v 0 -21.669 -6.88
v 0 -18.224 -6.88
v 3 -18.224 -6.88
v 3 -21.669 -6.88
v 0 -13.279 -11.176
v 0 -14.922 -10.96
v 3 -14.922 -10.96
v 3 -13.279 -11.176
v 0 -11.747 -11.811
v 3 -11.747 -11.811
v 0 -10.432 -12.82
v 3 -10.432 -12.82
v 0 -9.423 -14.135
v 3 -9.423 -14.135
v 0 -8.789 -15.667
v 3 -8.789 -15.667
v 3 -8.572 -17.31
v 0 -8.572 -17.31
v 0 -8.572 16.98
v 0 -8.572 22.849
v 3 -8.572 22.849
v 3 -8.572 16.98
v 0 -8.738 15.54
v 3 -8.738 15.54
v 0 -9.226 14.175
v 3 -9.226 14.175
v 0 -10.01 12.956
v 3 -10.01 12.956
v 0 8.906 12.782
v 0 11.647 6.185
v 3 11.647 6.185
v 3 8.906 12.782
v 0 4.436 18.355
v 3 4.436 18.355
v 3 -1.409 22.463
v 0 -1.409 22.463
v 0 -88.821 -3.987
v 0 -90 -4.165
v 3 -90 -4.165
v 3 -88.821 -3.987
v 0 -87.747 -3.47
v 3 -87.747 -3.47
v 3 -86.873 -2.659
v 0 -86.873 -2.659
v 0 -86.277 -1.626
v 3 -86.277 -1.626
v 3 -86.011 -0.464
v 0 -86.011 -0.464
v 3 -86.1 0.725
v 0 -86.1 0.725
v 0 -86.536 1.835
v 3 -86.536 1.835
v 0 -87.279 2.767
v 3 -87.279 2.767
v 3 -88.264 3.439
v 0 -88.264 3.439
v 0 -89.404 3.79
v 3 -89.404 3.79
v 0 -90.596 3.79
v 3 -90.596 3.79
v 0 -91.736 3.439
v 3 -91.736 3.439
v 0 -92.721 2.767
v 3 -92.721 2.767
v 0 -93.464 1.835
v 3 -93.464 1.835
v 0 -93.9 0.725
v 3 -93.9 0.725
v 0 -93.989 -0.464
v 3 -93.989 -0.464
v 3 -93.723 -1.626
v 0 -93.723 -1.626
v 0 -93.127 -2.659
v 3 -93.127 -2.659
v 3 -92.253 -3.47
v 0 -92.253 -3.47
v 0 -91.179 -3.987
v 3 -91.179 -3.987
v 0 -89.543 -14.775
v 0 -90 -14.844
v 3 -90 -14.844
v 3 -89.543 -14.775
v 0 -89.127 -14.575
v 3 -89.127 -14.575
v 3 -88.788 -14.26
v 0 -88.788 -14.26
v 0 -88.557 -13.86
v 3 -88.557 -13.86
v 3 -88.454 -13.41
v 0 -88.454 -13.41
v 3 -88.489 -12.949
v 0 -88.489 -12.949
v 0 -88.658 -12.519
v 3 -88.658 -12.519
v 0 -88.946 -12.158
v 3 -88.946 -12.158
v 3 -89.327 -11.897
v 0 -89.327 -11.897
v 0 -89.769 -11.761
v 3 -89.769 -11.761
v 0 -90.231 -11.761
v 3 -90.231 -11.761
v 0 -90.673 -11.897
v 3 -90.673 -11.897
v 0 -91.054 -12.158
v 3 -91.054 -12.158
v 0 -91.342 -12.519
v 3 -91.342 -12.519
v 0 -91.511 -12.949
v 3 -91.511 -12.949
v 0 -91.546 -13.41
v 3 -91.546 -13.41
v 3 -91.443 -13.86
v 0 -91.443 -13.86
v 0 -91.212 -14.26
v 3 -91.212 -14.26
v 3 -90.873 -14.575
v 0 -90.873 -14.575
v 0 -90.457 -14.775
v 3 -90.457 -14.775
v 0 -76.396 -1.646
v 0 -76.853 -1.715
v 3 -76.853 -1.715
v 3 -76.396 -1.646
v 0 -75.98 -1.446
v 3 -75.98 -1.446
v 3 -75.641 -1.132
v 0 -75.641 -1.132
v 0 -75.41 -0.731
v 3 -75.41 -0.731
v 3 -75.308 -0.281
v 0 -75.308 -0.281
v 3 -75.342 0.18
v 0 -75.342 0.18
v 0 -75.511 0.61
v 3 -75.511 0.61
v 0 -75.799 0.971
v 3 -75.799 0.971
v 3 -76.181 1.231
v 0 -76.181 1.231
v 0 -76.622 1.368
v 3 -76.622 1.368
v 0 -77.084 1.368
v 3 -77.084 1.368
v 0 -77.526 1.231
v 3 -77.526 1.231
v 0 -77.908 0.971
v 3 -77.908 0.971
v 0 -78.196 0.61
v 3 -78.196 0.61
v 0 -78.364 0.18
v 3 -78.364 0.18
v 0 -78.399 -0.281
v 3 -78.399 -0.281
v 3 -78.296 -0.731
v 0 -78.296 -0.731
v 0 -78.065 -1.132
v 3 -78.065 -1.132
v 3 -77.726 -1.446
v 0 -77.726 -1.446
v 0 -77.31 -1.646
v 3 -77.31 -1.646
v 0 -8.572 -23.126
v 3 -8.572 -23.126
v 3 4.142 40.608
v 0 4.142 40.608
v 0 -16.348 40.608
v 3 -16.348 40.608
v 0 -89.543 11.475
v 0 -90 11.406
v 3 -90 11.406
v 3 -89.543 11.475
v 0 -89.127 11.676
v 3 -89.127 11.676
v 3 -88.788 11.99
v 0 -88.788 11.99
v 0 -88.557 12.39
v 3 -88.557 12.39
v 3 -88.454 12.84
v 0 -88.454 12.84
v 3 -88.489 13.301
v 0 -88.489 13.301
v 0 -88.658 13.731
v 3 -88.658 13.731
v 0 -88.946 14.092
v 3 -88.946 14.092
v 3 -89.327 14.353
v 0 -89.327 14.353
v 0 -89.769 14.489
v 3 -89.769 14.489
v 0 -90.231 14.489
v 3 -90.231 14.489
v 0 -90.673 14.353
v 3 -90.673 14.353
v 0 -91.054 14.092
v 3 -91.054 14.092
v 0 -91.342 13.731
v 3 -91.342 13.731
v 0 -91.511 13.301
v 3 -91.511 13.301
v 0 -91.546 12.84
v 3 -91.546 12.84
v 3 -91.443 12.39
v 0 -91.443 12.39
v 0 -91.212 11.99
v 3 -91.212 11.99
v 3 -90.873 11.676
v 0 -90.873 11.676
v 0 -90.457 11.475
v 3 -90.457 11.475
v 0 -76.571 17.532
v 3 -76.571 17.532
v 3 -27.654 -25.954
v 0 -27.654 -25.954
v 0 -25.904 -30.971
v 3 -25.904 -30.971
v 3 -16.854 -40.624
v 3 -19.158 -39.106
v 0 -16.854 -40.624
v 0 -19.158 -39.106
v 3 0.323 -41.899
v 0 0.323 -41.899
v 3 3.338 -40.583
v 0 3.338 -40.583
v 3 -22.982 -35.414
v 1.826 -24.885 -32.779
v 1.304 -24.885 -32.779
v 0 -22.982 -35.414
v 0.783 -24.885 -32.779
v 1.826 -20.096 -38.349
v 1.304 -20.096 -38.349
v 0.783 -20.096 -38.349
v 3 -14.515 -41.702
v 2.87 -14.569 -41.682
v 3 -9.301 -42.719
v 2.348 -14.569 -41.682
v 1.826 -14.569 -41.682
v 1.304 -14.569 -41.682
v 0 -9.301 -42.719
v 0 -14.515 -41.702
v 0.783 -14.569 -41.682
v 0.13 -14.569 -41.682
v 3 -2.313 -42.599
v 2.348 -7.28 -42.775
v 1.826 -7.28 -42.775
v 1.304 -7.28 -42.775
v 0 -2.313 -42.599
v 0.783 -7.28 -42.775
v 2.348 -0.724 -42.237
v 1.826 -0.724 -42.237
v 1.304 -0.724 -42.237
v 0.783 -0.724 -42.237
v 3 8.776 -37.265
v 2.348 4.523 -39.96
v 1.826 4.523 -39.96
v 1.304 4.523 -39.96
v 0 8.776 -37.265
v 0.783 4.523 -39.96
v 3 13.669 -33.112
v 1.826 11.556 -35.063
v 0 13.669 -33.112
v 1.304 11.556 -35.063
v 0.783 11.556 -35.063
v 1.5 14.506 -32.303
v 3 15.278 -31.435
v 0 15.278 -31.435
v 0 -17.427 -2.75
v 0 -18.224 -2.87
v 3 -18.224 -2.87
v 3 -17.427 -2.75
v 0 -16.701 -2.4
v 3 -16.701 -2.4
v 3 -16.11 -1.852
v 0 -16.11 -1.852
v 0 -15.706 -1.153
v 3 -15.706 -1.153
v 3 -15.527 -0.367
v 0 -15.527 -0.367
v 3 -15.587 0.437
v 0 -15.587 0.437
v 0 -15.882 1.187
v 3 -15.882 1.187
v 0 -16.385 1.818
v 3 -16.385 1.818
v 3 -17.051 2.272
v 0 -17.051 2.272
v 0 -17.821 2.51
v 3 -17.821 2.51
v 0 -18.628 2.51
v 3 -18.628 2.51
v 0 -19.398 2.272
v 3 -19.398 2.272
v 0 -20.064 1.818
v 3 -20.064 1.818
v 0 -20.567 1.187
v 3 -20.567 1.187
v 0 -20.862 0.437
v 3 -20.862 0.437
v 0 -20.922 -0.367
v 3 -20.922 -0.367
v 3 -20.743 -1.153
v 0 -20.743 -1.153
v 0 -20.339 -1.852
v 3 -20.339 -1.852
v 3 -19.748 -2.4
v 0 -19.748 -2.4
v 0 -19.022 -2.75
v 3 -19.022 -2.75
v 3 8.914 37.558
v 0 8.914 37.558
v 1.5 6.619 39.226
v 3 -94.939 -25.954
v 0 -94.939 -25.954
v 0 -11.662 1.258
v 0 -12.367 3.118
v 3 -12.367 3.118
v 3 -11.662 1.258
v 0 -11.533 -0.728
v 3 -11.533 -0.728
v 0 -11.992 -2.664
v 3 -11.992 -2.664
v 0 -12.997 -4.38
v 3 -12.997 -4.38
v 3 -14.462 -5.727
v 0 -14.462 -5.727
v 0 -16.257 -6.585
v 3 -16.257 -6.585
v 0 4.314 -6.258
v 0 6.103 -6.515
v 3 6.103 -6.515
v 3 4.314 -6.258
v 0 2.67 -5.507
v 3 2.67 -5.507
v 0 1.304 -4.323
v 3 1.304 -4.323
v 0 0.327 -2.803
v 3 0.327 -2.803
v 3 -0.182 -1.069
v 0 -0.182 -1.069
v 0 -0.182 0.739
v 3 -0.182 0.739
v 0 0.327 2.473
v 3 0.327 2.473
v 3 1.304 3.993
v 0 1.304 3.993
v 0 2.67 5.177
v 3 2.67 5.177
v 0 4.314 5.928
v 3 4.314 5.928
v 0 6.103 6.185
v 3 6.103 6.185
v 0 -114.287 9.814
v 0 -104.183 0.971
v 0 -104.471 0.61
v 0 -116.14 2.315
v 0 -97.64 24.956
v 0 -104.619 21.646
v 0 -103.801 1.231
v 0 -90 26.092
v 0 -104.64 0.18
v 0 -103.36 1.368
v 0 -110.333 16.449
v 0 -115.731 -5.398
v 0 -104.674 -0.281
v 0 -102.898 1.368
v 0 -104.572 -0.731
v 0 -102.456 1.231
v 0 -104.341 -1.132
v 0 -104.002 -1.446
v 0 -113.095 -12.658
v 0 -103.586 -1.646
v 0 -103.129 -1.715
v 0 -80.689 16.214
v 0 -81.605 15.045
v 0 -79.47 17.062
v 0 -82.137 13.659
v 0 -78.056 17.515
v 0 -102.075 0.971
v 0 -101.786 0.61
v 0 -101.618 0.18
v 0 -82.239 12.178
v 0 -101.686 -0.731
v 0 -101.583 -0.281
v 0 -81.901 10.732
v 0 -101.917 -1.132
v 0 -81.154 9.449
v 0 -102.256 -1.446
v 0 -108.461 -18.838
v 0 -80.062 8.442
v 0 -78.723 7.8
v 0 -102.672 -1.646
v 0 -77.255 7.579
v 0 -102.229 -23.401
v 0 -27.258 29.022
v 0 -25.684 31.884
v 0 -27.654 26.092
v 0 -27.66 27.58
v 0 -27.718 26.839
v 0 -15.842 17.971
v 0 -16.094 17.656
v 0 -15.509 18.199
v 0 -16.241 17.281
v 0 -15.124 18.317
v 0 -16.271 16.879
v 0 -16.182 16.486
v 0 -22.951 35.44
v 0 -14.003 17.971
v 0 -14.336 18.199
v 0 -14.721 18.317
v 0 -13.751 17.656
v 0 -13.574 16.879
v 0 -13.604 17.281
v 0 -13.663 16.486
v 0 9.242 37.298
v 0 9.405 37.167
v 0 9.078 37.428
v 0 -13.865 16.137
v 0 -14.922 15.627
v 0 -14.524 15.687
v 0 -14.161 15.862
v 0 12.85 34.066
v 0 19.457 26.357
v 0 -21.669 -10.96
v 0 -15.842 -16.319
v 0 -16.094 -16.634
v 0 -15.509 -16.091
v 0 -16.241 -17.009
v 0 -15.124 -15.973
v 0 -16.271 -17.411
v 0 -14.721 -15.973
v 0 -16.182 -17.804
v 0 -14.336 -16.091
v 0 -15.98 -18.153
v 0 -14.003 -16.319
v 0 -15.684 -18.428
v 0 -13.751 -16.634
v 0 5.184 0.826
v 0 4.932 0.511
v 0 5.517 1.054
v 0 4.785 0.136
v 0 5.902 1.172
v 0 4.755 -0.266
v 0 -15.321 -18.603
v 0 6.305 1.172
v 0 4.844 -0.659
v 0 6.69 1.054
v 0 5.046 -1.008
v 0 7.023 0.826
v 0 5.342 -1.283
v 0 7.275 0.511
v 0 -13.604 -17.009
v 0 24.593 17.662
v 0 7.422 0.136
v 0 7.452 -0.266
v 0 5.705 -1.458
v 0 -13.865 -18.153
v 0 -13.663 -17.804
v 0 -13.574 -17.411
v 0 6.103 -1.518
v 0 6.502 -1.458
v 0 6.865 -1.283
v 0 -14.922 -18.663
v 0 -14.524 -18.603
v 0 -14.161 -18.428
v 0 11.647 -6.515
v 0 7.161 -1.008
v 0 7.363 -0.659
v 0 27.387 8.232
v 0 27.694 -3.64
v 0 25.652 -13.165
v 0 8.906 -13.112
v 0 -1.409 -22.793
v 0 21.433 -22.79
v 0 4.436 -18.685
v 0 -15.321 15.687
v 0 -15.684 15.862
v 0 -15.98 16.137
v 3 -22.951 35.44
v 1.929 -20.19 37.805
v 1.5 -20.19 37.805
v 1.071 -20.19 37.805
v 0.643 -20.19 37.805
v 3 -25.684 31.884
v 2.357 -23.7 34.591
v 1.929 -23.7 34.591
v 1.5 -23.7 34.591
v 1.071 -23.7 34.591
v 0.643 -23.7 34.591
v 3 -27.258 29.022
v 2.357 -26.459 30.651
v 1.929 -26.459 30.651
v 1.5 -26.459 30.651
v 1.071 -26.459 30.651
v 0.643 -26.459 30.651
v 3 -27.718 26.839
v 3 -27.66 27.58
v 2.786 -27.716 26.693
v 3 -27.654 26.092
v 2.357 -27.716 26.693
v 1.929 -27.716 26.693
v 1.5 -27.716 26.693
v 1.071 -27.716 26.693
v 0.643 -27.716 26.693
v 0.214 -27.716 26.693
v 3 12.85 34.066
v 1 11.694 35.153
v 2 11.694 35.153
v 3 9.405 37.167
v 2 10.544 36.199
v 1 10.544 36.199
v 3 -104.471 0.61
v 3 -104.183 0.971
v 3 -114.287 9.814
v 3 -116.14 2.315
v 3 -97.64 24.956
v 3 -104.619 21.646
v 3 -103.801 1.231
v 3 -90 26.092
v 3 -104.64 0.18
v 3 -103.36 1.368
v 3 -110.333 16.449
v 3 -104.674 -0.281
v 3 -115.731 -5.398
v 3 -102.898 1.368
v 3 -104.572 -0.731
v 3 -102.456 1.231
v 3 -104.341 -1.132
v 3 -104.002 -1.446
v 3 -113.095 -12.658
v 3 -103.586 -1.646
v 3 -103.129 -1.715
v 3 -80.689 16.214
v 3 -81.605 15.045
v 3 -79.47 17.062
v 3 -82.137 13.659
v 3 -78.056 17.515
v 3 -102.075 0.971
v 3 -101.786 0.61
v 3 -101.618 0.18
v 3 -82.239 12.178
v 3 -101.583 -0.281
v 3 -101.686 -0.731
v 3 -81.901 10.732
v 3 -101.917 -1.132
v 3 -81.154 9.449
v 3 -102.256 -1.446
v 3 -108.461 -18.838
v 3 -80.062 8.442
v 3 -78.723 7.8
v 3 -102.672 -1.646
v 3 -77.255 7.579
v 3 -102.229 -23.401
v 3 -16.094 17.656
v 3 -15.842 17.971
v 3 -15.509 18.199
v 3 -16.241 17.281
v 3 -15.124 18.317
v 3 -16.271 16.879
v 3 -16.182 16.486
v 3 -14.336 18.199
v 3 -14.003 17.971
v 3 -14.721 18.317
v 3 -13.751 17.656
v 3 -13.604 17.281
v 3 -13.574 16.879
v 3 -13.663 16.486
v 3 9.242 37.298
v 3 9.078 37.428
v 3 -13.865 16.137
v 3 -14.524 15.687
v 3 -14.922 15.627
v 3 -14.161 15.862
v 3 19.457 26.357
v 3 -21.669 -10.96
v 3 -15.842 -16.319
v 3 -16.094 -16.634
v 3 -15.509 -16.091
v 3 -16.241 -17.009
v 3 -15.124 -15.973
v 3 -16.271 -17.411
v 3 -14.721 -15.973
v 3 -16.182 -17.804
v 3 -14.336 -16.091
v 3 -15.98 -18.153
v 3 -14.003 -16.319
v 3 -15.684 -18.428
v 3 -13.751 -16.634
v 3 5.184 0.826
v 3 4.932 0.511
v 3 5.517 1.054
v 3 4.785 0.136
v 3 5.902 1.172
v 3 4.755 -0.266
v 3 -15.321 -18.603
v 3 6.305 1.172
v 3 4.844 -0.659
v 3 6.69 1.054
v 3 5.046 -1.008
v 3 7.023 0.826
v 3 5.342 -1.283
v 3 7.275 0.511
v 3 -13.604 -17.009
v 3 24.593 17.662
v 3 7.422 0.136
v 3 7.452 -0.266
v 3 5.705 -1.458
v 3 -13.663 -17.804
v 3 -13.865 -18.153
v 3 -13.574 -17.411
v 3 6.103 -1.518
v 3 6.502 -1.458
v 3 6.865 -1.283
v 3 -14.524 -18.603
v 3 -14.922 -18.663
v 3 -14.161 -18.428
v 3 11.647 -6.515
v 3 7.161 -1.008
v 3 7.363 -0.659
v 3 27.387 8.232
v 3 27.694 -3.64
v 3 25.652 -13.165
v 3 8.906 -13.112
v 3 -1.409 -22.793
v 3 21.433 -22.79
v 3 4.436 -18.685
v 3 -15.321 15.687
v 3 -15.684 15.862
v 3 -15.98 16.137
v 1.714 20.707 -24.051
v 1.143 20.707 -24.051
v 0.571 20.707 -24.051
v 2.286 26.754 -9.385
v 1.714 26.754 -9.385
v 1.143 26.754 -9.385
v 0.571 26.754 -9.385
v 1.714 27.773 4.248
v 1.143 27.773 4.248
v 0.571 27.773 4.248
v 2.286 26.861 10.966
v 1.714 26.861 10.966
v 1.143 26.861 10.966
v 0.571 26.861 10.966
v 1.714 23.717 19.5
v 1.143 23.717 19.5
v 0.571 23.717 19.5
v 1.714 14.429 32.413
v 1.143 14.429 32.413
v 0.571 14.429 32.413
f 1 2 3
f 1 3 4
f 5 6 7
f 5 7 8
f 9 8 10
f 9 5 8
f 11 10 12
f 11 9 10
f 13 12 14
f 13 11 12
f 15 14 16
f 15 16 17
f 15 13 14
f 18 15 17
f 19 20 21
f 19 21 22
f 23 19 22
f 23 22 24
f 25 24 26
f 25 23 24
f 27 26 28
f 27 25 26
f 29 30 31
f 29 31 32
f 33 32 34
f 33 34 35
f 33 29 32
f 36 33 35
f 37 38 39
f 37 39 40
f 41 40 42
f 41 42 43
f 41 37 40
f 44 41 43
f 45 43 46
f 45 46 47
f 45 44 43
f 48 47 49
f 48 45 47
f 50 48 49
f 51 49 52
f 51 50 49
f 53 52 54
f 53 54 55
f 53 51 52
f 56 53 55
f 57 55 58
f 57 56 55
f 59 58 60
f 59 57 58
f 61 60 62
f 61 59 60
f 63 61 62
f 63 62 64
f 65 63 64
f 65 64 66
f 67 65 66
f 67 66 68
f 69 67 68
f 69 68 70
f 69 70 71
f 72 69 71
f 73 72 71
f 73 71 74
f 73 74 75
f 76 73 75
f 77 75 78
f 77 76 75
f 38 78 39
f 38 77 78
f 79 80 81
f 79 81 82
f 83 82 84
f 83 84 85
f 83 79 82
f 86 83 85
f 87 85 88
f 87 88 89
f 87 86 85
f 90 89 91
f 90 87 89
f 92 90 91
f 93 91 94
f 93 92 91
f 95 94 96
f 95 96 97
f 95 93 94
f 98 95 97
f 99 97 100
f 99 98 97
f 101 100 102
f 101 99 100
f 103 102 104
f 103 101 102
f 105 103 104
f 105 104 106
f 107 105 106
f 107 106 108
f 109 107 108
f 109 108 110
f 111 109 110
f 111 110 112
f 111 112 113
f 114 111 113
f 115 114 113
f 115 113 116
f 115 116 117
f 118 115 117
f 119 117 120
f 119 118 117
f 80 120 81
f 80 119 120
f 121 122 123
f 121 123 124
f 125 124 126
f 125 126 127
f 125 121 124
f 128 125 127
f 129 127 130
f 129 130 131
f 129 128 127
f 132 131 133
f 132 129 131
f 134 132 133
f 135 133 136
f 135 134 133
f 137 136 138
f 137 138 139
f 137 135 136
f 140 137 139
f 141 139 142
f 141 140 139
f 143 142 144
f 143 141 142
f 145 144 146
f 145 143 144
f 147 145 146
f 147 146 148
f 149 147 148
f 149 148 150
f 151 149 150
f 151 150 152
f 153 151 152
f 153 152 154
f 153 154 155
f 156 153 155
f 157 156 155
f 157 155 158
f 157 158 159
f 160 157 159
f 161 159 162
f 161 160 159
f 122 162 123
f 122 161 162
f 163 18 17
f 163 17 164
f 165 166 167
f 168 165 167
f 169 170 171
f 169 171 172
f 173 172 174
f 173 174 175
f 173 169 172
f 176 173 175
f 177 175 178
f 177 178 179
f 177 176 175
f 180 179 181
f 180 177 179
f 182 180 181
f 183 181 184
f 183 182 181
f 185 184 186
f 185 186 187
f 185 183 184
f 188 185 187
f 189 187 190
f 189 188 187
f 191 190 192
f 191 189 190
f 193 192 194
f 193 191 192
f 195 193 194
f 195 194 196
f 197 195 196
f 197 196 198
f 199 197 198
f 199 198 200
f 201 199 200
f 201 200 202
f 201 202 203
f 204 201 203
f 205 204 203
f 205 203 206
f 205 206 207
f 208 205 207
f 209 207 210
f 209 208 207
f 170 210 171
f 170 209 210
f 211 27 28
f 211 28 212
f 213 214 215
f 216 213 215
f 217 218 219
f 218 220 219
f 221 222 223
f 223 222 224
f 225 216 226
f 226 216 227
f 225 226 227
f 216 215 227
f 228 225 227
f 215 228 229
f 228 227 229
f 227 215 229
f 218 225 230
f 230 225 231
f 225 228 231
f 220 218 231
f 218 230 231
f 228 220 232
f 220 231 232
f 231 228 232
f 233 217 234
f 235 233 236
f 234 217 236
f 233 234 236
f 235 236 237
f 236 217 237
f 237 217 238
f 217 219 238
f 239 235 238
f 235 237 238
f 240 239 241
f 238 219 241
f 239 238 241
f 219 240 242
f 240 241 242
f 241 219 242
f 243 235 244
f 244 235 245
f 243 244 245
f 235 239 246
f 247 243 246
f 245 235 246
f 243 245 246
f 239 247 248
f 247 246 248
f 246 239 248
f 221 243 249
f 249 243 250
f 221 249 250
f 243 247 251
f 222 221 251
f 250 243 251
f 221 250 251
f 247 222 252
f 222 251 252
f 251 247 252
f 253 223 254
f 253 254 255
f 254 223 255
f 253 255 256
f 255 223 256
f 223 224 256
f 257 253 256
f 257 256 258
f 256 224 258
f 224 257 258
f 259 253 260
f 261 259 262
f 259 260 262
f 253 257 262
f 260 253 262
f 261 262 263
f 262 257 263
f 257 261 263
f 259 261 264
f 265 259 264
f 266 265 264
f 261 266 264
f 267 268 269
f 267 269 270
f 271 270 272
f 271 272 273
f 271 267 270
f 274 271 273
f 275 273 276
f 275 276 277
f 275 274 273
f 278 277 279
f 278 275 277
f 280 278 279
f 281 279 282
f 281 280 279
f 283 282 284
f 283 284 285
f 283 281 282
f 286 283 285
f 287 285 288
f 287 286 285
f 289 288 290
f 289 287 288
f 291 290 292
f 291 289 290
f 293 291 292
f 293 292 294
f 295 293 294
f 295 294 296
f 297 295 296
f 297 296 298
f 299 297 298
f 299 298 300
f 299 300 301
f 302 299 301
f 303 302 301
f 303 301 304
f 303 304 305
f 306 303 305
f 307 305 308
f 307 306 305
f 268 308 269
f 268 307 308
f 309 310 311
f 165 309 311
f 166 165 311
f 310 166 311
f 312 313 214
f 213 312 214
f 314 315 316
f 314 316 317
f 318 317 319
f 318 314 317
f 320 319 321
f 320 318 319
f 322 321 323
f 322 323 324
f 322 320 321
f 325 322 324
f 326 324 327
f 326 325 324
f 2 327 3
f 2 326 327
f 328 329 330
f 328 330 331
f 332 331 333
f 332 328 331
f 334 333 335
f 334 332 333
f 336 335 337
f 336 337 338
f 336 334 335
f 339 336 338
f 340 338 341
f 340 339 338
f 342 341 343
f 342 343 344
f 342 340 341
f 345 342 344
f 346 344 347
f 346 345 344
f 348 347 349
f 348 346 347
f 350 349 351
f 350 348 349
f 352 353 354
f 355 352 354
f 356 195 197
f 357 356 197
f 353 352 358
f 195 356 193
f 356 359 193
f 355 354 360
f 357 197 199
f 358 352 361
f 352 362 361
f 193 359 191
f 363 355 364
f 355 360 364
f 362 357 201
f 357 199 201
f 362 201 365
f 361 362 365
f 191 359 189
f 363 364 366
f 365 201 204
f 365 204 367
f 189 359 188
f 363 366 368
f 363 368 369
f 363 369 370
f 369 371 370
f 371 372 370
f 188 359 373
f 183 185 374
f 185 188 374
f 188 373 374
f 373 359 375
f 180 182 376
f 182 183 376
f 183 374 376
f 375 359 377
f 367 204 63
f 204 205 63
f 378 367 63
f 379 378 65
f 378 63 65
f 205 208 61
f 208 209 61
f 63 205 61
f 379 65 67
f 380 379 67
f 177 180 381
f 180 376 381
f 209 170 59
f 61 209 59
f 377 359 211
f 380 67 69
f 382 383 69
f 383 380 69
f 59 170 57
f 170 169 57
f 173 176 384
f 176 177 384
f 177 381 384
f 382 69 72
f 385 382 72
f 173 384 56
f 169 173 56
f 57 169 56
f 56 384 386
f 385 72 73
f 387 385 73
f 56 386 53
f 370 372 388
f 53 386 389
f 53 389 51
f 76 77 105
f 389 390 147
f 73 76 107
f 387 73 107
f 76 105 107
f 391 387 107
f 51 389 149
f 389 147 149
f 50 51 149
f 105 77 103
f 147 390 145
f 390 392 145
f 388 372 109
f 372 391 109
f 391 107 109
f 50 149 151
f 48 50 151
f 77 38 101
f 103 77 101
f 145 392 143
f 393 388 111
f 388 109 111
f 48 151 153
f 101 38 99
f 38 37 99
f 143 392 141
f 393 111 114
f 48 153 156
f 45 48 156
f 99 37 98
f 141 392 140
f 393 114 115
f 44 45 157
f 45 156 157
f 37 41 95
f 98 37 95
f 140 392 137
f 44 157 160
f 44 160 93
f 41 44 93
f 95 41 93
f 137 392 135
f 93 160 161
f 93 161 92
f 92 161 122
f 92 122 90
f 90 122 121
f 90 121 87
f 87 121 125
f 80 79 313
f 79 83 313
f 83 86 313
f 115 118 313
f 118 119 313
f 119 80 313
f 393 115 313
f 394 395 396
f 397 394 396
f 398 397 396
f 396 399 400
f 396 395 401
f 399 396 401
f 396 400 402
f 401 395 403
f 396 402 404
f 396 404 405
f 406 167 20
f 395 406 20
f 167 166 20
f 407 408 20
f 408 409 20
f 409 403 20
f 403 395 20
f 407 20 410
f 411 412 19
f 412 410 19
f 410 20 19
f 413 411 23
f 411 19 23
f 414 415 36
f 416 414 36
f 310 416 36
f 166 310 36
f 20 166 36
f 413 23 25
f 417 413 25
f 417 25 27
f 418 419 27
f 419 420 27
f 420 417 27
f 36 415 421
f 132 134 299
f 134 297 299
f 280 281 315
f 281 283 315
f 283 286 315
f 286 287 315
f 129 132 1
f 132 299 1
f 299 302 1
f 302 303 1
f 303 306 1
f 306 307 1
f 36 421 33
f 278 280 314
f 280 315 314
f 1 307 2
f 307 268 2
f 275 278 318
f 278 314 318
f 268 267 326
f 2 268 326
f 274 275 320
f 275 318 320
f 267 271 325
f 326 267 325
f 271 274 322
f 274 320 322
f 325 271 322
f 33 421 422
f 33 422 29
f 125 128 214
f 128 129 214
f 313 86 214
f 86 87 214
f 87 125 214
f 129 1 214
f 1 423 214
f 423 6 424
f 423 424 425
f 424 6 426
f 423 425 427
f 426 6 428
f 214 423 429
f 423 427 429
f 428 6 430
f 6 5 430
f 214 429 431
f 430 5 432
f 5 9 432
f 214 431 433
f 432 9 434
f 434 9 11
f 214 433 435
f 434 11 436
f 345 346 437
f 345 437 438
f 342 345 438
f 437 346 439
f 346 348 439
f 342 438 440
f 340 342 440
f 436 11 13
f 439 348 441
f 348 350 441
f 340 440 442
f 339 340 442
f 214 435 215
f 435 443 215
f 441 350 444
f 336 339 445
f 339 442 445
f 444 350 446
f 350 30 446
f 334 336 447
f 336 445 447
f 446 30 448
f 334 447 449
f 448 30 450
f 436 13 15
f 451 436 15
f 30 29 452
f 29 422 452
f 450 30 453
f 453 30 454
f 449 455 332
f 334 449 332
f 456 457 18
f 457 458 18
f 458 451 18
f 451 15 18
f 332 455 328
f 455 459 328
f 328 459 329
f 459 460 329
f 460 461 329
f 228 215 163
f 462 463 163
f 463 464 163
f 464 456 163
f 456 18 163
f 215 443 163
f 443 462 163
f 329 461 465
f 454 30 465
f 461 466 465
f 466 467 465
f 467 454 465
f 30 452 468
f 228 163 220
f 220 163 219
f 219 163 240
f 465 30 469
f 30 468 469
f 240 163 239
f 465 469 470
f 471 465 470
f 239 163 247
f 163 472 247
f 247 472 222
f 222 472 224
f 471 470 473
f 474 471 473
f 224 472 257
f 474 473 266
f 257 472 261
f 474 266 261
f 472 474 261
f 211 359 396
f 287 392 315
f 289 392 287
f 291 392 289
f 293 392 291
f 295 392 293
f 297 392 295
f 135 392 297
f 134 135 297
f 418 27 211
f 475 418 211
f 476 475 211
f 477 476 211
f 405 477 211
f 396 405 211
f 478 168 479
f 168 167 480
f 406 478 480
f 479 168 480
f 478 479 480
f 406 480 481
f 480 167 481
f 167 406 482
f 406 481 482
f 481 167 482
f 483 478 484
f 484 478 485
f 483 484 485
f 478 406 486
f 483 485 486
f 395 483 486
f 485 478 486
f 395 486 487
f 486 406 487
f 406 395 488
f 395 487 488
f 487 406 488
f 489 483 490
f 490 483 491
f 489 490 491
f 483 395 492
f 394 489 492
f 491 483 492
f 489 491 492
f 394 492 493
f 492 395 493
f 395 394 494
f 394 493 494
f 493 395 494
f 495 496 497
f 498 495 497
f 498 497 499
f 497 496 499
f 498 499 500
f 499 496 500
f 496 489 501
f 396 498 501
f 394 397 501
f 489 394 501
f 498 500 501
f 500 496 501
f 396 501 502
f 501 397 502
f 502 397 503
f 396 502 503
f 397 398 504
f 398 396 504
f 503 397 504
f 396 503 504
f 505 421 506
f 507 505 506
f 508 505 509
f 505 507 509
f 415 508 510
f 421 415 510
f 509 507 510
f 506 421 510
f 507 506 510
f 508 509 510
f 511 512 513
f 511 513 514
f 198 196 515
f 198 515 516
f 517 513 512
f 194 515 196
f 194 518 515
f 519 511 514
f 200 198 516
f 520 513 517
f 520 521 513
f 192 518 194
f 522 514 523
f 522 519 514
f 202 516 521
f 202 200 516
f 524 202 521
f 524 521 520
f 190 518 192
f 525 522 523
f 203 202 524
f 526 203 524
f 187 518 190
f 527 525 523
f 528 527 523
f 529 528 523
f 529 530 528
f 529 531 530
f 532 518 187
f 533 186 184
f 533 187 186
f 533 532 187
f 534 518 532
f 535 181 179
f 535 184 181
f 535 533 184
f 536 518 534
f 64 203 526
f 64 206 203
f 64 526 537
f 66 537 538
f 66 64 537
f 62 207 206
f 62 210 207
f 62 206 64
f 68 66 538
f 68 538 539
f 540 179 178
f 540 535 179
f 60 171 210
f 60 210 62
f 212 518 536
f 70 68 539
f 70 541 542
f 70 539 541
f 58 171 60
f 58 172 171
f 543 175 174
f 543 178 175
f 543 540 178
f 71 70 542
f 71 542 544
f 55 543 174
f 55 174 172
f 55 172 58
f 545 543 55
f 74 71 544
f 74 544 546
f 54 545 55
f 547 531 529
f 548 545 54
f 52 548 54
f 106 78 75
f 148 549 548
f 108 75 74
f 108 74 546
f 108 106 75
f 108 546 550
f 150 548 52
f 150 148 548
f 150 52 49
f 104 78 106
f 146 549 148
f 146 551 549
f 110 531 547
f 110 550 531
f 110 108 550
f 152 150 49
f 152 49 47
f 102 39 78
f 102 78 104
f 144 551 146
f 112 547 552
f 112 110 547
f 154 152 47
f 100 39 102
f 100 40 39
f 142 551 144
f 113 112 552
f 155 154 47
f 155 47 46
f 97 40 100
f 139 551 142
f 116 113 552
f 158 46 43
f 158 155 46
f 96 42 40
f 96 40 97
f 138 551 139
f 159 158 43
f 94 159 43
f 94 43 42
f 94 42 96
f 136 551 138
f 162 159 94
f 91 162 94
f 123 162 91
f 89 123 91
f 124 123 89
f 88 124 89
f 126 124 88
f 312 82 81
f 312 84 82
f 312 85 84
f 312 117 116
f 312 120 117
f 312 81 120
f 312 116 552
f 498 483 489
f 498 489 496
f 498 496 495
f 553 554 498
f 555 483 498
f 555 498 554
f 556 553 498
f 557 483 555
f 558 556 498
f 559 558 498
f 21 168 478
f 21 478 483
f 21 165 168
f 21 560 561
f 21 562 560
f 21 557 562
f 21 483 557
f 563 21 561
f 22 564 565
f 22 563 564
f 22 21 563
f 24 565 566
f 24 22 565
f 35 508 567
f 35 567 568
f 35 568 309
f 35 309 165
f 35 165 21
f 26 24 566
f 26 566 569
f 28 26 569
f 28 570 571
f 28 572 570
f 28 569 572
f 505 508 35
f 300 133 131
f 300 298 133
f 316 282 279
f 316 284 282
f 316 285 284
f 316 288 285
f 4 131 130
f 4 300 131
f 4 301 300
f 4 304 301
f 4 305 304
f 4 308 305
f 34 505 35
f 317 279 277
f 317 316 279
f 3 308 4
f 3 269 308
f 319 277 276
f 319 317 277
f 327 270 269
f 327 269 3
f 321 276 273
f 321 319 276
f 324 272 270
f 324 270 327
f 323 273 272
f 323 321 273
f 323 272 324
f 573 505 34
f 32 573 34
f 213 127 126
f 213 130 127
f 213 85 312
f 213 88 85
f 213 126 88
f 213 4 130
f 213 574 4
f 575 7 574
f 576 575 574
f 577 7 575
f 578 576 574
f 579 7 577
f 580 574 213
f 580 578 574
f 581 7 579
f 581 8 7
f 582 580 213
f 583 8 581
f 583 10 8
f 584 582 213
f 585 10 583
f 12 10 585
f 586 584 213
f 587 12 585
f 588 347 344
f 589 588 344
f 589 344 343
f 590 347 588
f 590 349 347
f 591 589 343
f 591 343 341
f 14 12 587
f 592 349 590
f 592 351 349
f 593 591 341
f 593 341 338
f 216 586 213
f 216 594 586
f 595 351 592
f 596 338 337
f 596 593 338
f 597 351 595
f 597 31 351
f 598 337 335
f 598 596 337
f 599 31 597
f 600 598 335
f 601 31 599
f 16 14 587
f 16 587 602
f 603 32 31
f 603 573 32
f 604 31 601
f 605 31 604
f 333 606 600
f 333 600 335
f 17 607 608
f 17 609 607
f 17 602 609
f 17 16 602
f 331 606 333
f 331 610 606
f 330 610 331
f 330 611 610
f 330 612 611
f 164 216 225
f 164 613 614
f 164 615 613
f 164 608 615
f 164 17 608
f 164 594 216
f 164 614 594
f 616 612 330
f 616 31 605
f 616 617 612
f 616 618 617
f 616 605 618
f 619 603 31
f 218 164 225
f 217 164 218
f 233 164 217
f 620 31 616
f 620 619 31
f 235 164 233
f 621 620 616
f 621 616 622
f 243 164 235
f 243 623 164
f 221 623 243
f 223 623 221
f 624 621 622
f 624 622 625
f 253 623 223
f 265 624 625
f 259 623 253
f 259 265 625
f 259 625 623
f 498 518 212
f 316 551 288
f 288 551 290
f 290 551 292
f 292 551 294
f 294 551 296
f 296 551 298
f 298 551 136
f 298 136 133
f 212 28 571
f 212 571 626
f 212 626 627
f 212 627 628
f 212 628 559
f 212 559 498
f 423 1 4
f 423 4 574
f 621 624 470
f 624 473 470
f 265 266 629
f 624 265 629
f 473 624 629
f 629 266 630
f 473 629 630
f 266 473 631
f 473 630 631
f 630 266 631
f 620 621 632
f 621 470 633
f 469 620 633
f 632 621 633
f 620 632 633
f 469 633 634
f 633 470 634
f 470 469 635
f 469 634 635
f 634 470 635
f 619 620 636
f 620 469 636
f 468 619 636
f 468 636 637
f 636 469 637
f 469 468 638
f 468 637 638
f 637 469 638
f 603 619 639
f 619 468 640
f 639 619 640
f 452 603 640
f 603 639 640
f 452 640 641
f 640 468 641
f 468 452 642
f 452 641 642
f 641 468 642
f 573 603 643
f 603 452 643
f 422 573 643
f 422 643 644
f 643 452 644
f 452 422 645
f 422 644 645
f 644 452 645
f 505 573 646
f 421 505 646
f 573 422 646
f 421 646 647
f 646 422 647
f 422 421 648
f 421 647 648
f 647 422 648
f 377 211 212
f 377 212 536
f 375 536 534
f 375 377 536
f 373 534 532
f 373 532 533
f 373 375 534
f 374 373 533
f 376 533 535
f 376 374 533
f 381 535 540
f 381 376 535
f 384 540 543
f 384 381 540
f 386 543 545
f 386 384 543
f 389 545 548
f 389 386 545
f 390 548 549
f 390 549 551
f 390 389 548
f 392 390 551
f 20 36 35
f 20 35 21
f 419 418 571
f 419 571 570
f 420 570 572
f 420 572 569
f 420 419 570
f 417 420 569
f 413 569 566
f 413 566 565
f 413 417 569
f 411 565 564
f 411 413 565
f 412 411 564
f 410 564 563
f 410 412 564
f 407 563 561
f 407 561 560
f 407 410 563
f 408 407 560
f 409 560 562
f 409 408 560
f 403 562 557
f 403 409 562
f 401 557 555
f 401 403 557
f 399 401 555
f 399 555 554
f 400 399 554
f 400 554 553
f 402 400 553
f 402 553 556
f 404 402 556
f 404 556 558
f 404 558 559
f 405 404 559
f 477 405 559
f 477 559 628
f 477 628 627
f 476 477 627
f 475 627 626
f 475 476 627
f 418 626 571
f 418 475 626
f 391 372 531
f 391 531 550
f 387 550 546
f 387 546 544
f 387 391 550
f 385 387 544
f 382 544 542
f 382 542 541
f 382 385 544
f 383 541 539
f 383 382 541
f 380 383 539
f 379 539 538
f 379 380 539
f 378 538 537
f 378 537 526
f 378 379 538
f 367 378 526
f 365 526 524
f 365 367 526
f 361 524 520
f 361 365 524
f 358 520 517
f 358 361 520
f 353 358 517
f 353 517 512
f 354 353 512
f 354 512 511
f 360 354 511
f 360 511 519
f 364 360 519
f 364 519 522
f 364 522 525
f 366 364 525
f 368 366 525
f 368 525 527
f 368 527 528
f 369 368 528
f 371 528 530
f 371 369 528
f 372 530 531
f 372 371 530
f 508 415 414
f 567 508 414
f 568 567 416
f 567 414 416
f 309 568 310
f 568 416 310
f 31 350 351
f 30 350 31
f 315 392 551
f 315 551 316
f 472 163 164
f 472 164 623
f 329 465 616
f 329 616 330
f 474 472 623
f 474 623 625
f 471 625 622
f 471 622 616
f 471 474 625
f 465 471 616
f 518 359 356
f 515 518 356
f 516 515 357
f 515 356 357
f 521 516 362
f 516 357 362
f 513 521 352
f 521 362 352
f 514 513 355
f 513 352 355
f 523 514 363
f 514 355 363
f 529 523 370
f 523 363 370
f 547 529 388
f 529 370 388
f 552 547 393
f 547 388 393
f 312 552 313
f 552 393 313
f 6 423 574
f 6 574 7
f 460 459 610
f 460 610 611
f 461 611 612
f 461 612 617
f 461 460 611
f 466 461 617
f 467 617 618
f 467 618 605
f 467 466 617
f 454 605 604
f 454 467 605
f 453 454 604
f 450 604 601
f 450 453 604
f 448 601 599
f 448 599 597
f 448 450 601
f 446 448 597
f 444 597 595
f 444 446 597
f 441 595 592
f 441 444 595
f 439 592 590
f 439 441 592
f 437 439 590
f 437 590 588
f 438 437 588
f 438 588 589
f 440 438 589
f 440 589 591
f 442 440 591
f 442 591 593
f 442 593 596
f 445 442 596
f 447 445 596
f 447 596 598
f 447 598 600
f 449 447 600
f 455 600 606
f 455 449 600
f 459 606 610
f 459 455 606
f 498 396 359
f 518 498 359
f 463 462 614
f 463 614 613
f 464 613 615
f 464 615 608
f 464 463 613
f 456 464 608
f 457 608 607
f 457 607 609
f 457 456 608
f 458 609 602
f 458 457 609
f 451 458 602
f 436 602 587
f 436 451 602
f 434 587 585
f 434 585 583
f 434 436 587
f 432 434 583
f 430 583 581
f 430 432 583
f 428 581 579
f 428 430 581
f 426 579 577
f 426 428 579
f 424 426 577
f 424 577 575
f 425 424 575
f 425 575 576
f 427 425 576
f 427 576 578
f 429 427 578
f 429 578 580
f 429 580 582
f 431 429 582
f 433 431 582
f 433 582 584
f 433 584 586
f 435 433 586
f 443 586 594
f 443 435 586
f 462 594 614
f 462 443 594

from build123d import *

# Parameters (mm, degrees)
ESQUISSE3_R        = 1.35255
ESQUISSE3_R_2      = 2.7051
ESQUISSE3_R_3      = 1.55
ESQUISSE3_R_4      = 4
BOSS_EXTRU_2_DEPTH = 3


with BuildPart() as part:
    # Esquisse3 → Boss.-Extru.2 (new body)
    with BuildSketch(Plane(origin=(0, 0, 0), x_dir=(0, 0, -1), z_dir=(1, 0, 0))):
        with BuildLine():
            Line((-40.60825, -16.144875), (-40.60825, -16.348305132))
            add(Edge.make_bspline(
                [(-40.60825, -16.348305132), (-40.365634485, -16.661193605), (-40.112338127, -16.96547542), (-39.63020507, -17.593748723), (-39.400688032, -17.917191992), (-38.719045939, -18.893089111), (-38.271947044, -19.549593057), (-37.338540998, -20.831006808), (-36.855460104, -21.458516341), (-36.059725811, -22.342477591), (-35.781944124, -22.627029047), (-35.202868212, -23.17718548), (-34.900674383, -23.443503751), (-33.971943166, -24.212706181), (-33.324405882, -24.685383849), (-32.010805282, -25.604549776), (-31.348089528, -26.055770333), (-30.303090708, -26.660610546), (-29.948270215, -26.848696892), (-29.222483721, -27.184971005), (-28.851412004, -27.333773538), (-28.083597976, -27.570691368), (-27.685315555, -27.657976057), (-27.090666934, -27.715403346), (-26.891908645, -27.722631025), (-26.592836888, -27.712936491), (-26.492990431, -27.706278992), (-26.292963936, -27.685632014), (-26.192732932, -27.670522326), (-26.092449031, -27.65425)],
                knots=[0, 0, 0, 0, 0.0625, 0.0625, 0.125, 0.125, 0.25, 0.25, 0.375, 0.375, 0.4375, 0.4375, 0.5, 0.5, 0.625, 0.625, 0.75, 0.75, 0.8125, 0.8125, 0.875, 0.875, 0.9375, 0.9375, 0.96875, 0.96875, 0.984375, 0.984375, 1, 1, 1, 1], degree=3))
            Line((-26.092449031, -27.65425), (-26.092449031, -90))
            ThreePointArc((-26.092449031, -90), (-2.31531669, -116.14013034), (25.954024412, -94.93864949))
            Line((25.954024412, -94.93864949), (25.954024412, -27.65425))
            add(Edge.make_bspline(
                [(25.954024412, -27.65425), (27.179118802, -27.419536533), (28.353377808, -27.051803075), (30.05705383, -26.34918771), (30.615126485, -26.089288473), (31.712904721, -25.521429223), (32.254485024, -25.212118815), (33.827204106, -24.230350536), (34.814025463, -23.502087852), (36.672007358, -21.907218093), (37.543320305, -21.040793316), (38.751902771, -19.623473398), (39.134714509, -19.134962989), (39.851014333, -18.131439591), (40.185535135, -17.615291382), (40.801362362, -16.550595558), (41.082635497, -16.002027673), (41.457015911, -15.150237789), (41.574249194, -14.86042264), (41.789713906, -14.277065554), (41.888049248, -13.98351322), (42.334688534, -12.506770959), (42.546239761, -11.296312151), (42.717568356, -9.451511475), (42.750611649, -8.83067761), (42.772859866, -7.900507946), (42.775360474, -7.590422151), (42.77555993, -6.970221998), (42.772087252, -6.66010067), (42.772087252, -6.35)],
                knots=[0, 0, 0, 0, 0.125, 0.125, 0.1875, 0.1875, 0.25, 0.25, 0.375, 0.375, 0.5, 0.5, 0.5625, 0.5625, 0.625, 0.625, 0.6875, 0.6875, 0.71875, 0.71875, 0.75, 0.75, 0.875, 0.875, 0.9375, 0.9375, 0.96875, 0.96875, 1, 1, 1, 1], degree=3))
            add(Edge.make_bspline(
                [(42.772087252, -6.35), (42.772087252, -5.874878454), (42.783792207, -5.398095979), (42.789657917, -4.447020546), (42.781867467, -3.973004463), (42.672546396, -2.563152451), (42.499179213, -1.637510108), (42.106282017, -0.267897459), (41.954068536, 0.185625042), (41.614819435, 1.087728793), (41.430081297, 1.530283034), (40.844911495, 2.839259084), (40.416604561, 3.689518781), (39.046783283, 6.190525131), (38.013123304, 7.787251584), (36.291657446, 10.082106977), (35.688509547, 10.830664164), (34.43654182, 12.281738953), (33.786199883, 12.985690235), (33.112075, 13.668565083)],
                knots=[0, 0, 0, 0, 0.0625, 0.0625, 0.125, 0.125, 0.25, 0.25, 0.3125, 0.3125, 0.375, 0.375, 0.5, 0.5, 0.75, 0.75, 0.875, 0.875, 1, 1, 1, 1], degree=3))
            add(Edge.make_bspline(
                [(33.112075, 13.668565083), (32.332207955, 14.539101946), (31.435060987, 15.277734234)],
                knots=[0, 0, 0, 1, 1, 1], degree=2))
            add(Edge.make_bspline(
                [(31.435060987, 15.277734234), (30.299691041, 16.309376592), (29.113704516, 17.275445235), (26.646604831, 19.084346085), (25.360475951, 19.928267183), (21.432297769, 22.265681686), (18.70167828, 23.563722979), (14.477833082, 25.213127628), (13.049229105, 25.71486416), (10.864398428, 26.369911185), (10.129061703, 26.571832136), (8.64156399, 26.936524394), (7.890831572, 27.098844789), (5.637990782, 27.512412208), (4.127431428, 27.693727696), (2.225306731, 27.768676851), (1.844136038, 27.775542931), (1.080940786, 27.779973661), (0.698904769, 27.777413484), (-0.446346689, 27.779064109), (-1.208874123, 27.797823926), (-2.732682239, 27.815308111), (-3.492085471, 27.806304753), (-5.004084105, 27.739990771), (-5.756994671, 27.684916502), (-8.006157922, 27.451797552), (-9.492662784, 27.204583891), (-11.701987236, 26.688775277), (-12.434852331, 26.491461598), (-13.894254142, 26.051929085), (-14.622118919, 25.807493497), (-16.765417144, 25.01223388), (-18.151500369, 24.400517874), (-20.847821735, 23.032525232), (-22.158708475, 22.277484827), (-24.716496252, 20.645447351), (-25.966430559, 19.7652326), (-28.39125747, 17.919703458), (-29.567431908, 16.954258357), (-31.287557173, 15.454109034), (-31.85380584, 14.945666112), (-32.972832423, 13.91291508), (-33.52577931, 13.388805977), (-34.066096443, 12.849822171)],
                knots=[0, 0, 0, 0, 0.0625, 0.0625, 0.125, 0.125, 0.25, 0.25, 0.3125, 0.3125, 0.34375, 0.34375, 0.375, 0.375, 0.4375, 0.4375, 0.453125, 0.453125, 0.46875, 0.46875, 0.5, 0.5, 0.53125, 0.53125, 0.5625, 0.5625, 0.625, 0.625, 0.65625, 0.65625, 0.6875, 0.6875, 0.75, 0.75, 0.8125, 0.8125, 0.875, 0.875, 0.9375, 0.9375, 0.96875, 0.96875, 1, 1, 1, 1], degree=3))
            add(Edge.make_bspline(
                [(-34.066096443, 12.849822171), (-35.159801618, 11.692162737), (-36.251081621, 10.53740284), (-37.166580532, 9.404947171)],
                knots=[0, 0, 0, 0, 1, 1, 1, 1], degree=3))
            ThreePointArc((-37.166580532, 9.404947171), (-37.363014685, 9.160281042), (-37.557796616, 8.914297524))
            add(Edge.make_bspline(
                [(-37.557796616, 8.914297524), (-38.142933539, 8.170182683), (-38.709522845, 7.412667282), (-39.741912272, 5.824816801), (-40.203133529, 4.998794666), (-40.60825, 4.142494902)],
                knots=[0, 0, 0, 0, 0.5, 0.5, 1, 1, 1, 1], degree=3))
            Line((-40.60825, 4.142494902), (-40.60825, -12.7))
            Line((-40.60825, -12.7), (-40.60825, -16.144875))
        make_face()
        with Locations((-16.9799, -14.9225)):
            Circle(ESQUISSE3_R, mode=Mode.SUBTRACT)
        with Locations((0.1651, -18.2245)):
            Circle(ESQUISSE3_R_2, mode=Mode.SUBTRACT)
        with Locations((17.3101, -14.9225)):
            Circle(ESQUISSE3_R, mode=Mode.SUBTRACT)
        with Locations((0.1651, 6.103472306)):
            Circle(ESQUISSE3_R, mode=Mode.SUBTRACT)
        with Locations((0.1651, -103.128774516)):
            Circle(ESQUISSE3_R_3, mode=Mode.SUBTRACT)
        with Locations((-12.956172959, -90)):
            Circle(ESQUISSE3_R_3, mode=Mode.SUBTRACT)
        with Locations((0.1651, -76.853281608)):
            Circle(ESQUISSE3_R_3, mode=Mode.SUBTRACT)
        with Locations((13.293874516, -90)):
            Circle(ESQUISSE3_R_3, mode=Mode.SUBTRACT)
        with Locations((0.1651, -90)):
            Circle(ESQUISSE3_R_4, mode=Mode.SUBTRACT)
        with BuildLine():
            Line((-6.1849, 6.103472306), (-6.1849, 11.646916554))
            ThreePointArc((-6.1849, 11.646916554), (-15.726599278, 6.86795928), (-22.463125, -1.408614826))
            Line((-22.463125, -1.408614826), (-22.848998606, -8.5725))
            Line((-22.848998606, -8.5725), (-16.9799, -8.5725))
            ThreePointArc((-16.9799, -8.5725), (-14.843492837, -8.942678562), (-12.956172959, -10.010054509))
            Line((-12.956172959, -10.010054509), (-17.532119892, -76.570733548))
            ThreePointArc((-17.532119892, -76.570733548), (-12.922094173, -82.243210377), (-7.579161123, -77.254984547))
            Line((-7.579161123, -77.254984547), (-3.118194312, -12.366780117))
            ThreePointArc((-3.118194312, -12.366780117), (3.559593485, -12.430510205), (6.880225, -18.2245))
            Line((6.880225, -18.2245), (6.880225, -21.669375))
            Line((6.880225, -21.669375), (10.9601, -21.669375))
            Line((10.9601, -21.669375), (10.9601, -14.9225))
            ThreePointArc((10.9601, -14.9225), (12.819971939, -10.432371939), (17.3101, -8.5725))
            Line((17.3101, -8.5725), (23.12590424, -8.5725))
            Line((23.12590424, -8.5725), (22.793325, -1.408614826))
            ThreePointArc((22.793325, -1.408614826), (16.056799278, 6.86795928), (6.5151, 11.646916554))
            Line((6.5151, 11.646916554), (6.5151, 6.103472306))
            ThreePointArc((6.5151, 6.103472306), (0.1651, -0.246527694), (-6.1849, 6.103472306))
        make_face(mode=Mode.SUBTRACT)
    extrude(amount=BOSS_EXTRU_2_DEPTH)


solid = part.part
